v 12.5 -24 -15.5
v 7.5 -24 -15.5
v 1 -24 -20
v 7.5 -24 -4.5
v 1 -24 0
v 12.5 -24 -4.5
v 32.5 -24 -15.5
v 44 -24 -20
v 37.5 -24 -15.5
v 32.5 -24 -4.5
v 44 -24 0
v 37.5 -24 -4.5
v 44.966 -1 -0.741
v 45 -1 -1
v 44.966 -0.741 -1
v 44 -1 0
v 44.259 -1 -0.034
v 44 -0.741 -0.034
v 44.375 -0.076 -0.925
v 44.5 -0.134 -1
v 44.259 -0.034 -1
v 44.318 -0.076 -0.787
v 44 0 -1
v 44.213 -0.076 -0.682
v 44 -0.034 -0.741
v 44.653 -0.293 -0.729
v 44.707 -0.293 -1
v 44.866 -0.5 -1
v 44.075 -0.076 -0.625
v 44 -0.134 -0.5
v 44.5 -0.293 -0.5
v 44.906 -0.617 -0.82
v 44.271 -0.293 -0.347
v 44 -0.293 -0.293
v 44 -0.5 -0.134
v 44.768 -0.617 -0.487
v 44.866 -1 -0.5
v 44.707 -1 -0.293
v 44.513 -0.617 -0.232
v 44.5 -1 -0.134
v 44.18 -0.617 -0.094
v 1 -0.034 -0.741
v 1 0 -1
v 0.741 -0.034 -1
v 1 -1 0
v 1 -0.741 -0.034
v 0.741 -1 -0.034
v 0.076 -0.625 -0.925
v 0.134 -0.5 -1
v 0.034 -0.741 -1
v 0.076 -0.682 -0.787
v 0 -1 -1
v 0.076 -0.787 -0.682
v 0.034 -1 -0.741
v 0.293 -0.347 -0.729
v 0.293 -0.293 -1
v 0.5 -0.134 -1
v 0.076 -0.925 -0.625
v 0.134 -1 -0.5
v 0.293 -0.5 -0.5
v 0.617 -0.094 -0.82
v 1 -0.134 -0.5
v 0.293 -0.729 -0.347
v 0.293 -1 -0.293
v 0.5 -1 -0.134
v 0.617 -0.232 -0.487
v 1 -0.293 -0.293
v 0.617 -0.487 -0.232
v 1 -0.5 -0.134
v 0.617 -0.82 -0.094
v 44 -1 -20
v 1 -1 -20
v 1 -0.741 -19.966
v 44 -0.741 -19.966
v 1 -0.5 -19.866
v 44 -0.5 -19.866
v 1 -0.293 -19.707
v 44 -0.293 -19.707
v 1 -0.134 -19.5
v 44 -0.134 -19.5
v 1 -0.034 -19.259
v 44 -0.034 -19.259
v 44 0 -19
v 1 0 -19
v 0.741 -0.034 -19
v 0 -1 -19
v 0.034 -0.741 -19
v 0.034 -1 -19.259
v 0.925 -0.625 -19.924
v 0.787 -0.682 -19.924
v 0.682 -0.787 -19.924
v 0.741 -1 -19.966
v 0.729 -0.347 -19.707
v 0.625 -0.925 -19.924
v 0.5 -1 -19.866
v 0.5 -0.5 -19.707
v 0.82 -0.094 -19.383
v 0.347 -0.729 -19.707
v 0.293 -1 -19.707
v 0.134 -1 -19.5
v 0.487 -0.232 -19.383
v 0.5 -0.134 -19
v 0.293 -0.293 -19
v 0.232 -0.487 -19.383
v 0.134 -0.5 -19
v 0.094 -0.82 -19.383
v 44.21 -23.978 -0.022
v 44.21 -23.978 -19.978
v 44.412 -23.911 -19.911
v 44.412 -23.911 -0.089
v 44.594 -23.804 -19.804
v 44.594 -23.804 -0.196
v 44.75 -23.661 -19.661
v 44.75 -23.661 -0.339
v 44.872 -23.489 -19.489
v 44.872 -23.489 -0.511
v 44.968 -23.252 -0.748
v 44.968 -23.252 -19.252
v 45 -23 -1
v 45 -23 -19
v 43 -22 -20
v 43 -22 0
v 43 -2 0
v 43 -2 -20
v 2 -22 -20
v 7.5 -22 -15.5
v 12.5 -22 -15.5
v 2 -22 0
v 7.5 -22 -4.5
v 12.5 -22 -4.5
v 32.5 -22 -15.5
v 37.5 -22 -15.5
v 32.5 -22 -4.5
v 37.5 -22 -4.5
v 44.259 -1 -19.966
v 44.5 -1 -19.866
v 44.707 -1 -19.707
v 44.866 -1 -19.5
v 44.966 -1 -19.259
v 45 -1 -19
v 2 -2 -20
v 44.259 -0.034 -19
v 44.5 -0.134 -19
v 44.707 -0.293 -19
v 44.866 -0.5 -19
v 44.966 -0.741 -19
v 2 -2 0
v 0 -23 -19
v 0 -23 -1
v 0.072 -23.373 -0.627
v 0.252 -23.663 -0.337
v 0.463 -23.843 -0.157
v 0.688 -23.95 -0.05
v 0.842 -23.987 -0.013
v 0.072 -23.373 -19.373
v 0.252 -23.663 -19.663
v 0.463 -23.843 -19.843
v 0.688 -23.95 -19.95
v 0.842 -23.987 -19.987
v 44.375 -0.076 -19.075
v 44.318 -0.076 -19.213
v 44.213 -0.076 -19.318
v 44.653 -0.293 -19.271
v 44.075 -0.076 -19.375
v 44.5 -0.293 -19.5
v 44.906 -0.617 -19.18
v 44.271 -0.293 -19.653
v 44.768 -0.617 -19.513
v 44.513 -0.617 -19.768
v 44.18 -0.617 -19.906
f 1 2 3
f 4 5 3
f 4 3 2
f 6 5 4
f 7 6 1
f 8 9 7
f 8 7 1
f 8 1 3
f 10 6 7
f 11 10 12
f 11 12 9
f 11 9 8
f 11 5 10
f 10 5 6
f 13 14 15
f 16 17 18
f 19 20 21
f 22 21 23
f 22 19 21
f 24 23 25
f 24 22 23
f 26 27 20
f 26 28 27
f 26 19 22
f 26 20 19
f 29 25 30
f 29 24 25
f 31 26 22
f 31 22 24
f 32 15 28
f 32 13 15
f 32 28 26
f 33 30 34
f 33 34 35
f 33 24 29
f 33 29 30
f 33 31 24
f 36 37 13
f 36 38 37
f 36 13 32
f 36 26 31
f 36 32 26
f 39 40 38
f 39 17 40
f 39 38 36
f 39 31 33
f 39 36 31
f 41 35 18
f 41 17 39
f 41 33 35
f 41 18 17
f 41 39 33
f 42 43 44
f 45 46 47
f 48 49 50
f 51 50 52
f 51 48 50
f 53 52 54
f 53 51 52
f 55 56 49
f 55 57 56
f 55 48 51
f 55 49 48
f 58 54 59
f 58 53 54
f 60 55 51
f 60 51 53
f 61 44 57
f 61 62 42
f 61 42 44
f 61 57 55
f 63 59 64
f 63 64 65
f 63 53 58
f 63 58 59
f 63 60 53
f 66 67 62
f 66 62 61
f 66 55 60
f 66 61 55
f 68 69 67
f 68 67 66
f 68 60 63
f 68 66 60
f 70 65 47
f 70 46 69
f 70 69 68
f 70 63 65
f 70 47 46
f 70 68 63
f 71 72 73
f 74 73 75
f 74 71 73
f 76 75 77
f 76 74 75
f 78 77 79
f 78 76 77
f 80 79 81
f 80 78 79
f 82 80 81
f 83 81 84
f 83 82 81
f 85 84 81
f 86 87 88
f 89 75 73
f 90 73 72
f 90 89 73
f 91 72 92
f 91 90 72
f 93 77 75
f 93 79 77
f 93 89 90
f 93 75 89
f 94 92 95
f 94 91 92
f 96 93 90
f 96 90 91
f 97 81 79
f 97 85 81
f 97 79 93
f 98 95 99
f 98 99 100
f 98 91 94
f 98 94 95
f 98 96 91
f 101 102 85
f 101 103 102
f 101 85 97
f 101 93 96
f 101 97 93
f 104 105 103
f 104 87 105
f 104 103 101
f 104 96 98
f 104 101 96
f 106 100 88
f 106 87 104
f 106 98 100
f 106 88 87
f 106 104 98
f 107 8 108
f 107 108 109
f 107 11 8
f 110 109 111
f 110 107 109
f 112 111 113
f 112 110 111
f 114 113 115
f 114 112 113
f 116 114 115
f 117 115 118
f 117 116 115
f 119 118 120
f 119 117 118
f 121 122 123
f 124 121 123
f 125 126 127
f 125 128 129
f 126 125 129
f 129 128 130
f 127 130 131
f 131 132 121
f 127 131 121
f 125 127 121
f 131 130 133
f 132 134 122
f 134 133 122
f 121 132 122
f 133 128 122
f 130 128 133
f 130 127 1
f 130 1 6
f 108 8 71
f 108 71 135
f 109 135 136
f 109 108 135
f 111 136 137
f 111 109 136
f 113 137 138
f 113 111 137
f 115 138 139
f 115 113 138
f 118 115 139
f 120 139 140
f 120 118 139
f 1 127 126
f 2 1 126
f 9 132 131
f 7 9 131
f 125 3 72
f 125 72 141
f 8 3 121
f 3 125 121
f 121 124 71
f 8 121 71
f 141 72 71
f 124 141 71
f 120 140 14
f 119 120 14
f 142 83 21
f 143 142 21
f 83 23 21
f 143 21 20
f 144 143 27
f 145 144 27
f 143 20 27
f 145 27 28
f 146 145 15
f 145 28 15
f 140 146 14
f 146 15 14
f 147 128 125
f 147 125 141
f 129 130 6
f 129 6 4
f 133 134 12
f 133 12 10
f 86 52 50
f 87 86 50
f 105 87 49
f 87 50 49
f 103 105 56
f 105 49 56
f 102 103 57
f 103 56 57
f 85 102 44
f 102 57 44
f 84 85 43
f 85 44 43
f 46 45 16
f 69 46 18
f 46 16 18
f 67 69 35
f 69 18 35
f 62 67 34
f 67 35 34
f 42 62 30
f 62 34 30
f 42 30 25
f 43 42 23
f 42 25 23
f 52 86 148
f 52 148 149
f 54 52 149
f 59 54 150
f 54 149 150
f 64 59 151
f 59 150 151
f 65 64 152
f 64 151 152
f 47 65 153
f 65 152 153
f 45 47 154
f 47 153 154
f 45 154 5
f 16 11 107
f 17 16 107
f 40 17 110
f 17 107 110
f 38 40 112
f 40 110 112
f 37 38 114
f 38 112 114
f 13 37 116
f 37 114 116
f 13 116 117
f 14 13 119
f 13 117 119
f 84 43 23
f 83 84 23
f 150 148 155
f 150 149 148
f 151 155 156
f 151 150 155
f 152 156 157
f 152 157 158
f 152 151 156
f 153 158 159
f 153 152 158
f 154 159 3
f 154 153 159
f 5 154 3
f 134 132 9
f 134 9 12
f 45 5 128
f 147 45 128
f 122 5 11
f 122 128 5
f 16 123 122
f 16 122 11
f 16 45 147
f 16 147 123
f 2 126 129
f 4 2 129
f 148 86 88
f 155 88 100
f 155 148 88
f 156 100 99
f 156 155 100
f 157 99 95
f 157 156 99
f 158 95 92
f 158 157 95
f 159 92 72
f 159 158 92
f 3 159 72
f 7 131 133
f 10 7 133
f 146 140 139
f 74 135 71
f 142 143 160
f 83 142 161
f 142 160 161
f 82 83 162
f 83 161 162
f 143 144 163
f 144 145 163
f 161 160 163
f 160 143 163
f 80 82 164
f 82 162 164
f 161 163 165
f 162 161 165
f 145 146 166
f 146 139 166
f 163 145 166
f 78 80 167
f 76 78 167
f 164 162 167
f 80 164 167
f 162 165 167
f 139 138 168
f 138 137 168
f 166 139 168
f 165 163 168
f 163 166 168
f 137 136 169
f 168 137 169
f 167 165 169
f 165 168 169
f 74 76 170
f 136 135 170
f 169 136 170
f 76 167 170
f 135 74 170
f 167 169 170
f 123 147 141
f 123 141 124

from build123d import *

# Parameters (mm, degrees)
F0_W     = 45
F0_H     = 20
F1_DEPTH = 24
F2_W     = 41
F2_H     = 20
F3_DEPTH = 20
F5_W     = 5
F5_H     = 11
F6_DEPTH = 5
F7_R     = 1


with BuildPart() as f1:
    # F0 (on Front) → F1 (new body)
    with BuildSketch(Plane.XZ):
        with Locations((22.5, -10)):
            Rectangle(F0_W, F0_H)
    extrude(amount=F1_DEPTH)

    # F2 (on Top) → F3 (cut, symmetric)
    with BuildSketch(Plane.XY):
        with Locations((22.5, -12)):
            Rectangle(F2_W, F2_H)
    extrude(amount=F3_DEPTH, both=True, mode=Mode.SUBTRACT)

    # F5 (on offset) → F6 (cut)
    with BuildSketch(Plane(origin=(0, -22, 0), x_dir=(-1, 0, 0), z_dir=(0, 1, 0))):
        with Locations((-10, -10)):
            Rectangle(F5_W, F5_H)
        with Locations((-35, -9.9999997467)):
            Rectangle(F5_W, F5_H)
    extrude(amount=-F6_DEPTH, mode=Mode.SUBTRACT)

    # F7
    f7_edges = [f1.edges().sort_by_distance(p)[0] for p in [
        (45, -12, -20),
        (45, -12, 0),
        (45, 0, -10),
        (45, -24, -10),
        (22.5, 0, 0),
        (0, 0, -10),
        (22.5, 0, -20),
        (0, -12, 0),
        (0, -12, -20),
        (0, -24, -10),
    ]]
    fillet(f7_edges, radius=F7_R)


solid = f1.part
